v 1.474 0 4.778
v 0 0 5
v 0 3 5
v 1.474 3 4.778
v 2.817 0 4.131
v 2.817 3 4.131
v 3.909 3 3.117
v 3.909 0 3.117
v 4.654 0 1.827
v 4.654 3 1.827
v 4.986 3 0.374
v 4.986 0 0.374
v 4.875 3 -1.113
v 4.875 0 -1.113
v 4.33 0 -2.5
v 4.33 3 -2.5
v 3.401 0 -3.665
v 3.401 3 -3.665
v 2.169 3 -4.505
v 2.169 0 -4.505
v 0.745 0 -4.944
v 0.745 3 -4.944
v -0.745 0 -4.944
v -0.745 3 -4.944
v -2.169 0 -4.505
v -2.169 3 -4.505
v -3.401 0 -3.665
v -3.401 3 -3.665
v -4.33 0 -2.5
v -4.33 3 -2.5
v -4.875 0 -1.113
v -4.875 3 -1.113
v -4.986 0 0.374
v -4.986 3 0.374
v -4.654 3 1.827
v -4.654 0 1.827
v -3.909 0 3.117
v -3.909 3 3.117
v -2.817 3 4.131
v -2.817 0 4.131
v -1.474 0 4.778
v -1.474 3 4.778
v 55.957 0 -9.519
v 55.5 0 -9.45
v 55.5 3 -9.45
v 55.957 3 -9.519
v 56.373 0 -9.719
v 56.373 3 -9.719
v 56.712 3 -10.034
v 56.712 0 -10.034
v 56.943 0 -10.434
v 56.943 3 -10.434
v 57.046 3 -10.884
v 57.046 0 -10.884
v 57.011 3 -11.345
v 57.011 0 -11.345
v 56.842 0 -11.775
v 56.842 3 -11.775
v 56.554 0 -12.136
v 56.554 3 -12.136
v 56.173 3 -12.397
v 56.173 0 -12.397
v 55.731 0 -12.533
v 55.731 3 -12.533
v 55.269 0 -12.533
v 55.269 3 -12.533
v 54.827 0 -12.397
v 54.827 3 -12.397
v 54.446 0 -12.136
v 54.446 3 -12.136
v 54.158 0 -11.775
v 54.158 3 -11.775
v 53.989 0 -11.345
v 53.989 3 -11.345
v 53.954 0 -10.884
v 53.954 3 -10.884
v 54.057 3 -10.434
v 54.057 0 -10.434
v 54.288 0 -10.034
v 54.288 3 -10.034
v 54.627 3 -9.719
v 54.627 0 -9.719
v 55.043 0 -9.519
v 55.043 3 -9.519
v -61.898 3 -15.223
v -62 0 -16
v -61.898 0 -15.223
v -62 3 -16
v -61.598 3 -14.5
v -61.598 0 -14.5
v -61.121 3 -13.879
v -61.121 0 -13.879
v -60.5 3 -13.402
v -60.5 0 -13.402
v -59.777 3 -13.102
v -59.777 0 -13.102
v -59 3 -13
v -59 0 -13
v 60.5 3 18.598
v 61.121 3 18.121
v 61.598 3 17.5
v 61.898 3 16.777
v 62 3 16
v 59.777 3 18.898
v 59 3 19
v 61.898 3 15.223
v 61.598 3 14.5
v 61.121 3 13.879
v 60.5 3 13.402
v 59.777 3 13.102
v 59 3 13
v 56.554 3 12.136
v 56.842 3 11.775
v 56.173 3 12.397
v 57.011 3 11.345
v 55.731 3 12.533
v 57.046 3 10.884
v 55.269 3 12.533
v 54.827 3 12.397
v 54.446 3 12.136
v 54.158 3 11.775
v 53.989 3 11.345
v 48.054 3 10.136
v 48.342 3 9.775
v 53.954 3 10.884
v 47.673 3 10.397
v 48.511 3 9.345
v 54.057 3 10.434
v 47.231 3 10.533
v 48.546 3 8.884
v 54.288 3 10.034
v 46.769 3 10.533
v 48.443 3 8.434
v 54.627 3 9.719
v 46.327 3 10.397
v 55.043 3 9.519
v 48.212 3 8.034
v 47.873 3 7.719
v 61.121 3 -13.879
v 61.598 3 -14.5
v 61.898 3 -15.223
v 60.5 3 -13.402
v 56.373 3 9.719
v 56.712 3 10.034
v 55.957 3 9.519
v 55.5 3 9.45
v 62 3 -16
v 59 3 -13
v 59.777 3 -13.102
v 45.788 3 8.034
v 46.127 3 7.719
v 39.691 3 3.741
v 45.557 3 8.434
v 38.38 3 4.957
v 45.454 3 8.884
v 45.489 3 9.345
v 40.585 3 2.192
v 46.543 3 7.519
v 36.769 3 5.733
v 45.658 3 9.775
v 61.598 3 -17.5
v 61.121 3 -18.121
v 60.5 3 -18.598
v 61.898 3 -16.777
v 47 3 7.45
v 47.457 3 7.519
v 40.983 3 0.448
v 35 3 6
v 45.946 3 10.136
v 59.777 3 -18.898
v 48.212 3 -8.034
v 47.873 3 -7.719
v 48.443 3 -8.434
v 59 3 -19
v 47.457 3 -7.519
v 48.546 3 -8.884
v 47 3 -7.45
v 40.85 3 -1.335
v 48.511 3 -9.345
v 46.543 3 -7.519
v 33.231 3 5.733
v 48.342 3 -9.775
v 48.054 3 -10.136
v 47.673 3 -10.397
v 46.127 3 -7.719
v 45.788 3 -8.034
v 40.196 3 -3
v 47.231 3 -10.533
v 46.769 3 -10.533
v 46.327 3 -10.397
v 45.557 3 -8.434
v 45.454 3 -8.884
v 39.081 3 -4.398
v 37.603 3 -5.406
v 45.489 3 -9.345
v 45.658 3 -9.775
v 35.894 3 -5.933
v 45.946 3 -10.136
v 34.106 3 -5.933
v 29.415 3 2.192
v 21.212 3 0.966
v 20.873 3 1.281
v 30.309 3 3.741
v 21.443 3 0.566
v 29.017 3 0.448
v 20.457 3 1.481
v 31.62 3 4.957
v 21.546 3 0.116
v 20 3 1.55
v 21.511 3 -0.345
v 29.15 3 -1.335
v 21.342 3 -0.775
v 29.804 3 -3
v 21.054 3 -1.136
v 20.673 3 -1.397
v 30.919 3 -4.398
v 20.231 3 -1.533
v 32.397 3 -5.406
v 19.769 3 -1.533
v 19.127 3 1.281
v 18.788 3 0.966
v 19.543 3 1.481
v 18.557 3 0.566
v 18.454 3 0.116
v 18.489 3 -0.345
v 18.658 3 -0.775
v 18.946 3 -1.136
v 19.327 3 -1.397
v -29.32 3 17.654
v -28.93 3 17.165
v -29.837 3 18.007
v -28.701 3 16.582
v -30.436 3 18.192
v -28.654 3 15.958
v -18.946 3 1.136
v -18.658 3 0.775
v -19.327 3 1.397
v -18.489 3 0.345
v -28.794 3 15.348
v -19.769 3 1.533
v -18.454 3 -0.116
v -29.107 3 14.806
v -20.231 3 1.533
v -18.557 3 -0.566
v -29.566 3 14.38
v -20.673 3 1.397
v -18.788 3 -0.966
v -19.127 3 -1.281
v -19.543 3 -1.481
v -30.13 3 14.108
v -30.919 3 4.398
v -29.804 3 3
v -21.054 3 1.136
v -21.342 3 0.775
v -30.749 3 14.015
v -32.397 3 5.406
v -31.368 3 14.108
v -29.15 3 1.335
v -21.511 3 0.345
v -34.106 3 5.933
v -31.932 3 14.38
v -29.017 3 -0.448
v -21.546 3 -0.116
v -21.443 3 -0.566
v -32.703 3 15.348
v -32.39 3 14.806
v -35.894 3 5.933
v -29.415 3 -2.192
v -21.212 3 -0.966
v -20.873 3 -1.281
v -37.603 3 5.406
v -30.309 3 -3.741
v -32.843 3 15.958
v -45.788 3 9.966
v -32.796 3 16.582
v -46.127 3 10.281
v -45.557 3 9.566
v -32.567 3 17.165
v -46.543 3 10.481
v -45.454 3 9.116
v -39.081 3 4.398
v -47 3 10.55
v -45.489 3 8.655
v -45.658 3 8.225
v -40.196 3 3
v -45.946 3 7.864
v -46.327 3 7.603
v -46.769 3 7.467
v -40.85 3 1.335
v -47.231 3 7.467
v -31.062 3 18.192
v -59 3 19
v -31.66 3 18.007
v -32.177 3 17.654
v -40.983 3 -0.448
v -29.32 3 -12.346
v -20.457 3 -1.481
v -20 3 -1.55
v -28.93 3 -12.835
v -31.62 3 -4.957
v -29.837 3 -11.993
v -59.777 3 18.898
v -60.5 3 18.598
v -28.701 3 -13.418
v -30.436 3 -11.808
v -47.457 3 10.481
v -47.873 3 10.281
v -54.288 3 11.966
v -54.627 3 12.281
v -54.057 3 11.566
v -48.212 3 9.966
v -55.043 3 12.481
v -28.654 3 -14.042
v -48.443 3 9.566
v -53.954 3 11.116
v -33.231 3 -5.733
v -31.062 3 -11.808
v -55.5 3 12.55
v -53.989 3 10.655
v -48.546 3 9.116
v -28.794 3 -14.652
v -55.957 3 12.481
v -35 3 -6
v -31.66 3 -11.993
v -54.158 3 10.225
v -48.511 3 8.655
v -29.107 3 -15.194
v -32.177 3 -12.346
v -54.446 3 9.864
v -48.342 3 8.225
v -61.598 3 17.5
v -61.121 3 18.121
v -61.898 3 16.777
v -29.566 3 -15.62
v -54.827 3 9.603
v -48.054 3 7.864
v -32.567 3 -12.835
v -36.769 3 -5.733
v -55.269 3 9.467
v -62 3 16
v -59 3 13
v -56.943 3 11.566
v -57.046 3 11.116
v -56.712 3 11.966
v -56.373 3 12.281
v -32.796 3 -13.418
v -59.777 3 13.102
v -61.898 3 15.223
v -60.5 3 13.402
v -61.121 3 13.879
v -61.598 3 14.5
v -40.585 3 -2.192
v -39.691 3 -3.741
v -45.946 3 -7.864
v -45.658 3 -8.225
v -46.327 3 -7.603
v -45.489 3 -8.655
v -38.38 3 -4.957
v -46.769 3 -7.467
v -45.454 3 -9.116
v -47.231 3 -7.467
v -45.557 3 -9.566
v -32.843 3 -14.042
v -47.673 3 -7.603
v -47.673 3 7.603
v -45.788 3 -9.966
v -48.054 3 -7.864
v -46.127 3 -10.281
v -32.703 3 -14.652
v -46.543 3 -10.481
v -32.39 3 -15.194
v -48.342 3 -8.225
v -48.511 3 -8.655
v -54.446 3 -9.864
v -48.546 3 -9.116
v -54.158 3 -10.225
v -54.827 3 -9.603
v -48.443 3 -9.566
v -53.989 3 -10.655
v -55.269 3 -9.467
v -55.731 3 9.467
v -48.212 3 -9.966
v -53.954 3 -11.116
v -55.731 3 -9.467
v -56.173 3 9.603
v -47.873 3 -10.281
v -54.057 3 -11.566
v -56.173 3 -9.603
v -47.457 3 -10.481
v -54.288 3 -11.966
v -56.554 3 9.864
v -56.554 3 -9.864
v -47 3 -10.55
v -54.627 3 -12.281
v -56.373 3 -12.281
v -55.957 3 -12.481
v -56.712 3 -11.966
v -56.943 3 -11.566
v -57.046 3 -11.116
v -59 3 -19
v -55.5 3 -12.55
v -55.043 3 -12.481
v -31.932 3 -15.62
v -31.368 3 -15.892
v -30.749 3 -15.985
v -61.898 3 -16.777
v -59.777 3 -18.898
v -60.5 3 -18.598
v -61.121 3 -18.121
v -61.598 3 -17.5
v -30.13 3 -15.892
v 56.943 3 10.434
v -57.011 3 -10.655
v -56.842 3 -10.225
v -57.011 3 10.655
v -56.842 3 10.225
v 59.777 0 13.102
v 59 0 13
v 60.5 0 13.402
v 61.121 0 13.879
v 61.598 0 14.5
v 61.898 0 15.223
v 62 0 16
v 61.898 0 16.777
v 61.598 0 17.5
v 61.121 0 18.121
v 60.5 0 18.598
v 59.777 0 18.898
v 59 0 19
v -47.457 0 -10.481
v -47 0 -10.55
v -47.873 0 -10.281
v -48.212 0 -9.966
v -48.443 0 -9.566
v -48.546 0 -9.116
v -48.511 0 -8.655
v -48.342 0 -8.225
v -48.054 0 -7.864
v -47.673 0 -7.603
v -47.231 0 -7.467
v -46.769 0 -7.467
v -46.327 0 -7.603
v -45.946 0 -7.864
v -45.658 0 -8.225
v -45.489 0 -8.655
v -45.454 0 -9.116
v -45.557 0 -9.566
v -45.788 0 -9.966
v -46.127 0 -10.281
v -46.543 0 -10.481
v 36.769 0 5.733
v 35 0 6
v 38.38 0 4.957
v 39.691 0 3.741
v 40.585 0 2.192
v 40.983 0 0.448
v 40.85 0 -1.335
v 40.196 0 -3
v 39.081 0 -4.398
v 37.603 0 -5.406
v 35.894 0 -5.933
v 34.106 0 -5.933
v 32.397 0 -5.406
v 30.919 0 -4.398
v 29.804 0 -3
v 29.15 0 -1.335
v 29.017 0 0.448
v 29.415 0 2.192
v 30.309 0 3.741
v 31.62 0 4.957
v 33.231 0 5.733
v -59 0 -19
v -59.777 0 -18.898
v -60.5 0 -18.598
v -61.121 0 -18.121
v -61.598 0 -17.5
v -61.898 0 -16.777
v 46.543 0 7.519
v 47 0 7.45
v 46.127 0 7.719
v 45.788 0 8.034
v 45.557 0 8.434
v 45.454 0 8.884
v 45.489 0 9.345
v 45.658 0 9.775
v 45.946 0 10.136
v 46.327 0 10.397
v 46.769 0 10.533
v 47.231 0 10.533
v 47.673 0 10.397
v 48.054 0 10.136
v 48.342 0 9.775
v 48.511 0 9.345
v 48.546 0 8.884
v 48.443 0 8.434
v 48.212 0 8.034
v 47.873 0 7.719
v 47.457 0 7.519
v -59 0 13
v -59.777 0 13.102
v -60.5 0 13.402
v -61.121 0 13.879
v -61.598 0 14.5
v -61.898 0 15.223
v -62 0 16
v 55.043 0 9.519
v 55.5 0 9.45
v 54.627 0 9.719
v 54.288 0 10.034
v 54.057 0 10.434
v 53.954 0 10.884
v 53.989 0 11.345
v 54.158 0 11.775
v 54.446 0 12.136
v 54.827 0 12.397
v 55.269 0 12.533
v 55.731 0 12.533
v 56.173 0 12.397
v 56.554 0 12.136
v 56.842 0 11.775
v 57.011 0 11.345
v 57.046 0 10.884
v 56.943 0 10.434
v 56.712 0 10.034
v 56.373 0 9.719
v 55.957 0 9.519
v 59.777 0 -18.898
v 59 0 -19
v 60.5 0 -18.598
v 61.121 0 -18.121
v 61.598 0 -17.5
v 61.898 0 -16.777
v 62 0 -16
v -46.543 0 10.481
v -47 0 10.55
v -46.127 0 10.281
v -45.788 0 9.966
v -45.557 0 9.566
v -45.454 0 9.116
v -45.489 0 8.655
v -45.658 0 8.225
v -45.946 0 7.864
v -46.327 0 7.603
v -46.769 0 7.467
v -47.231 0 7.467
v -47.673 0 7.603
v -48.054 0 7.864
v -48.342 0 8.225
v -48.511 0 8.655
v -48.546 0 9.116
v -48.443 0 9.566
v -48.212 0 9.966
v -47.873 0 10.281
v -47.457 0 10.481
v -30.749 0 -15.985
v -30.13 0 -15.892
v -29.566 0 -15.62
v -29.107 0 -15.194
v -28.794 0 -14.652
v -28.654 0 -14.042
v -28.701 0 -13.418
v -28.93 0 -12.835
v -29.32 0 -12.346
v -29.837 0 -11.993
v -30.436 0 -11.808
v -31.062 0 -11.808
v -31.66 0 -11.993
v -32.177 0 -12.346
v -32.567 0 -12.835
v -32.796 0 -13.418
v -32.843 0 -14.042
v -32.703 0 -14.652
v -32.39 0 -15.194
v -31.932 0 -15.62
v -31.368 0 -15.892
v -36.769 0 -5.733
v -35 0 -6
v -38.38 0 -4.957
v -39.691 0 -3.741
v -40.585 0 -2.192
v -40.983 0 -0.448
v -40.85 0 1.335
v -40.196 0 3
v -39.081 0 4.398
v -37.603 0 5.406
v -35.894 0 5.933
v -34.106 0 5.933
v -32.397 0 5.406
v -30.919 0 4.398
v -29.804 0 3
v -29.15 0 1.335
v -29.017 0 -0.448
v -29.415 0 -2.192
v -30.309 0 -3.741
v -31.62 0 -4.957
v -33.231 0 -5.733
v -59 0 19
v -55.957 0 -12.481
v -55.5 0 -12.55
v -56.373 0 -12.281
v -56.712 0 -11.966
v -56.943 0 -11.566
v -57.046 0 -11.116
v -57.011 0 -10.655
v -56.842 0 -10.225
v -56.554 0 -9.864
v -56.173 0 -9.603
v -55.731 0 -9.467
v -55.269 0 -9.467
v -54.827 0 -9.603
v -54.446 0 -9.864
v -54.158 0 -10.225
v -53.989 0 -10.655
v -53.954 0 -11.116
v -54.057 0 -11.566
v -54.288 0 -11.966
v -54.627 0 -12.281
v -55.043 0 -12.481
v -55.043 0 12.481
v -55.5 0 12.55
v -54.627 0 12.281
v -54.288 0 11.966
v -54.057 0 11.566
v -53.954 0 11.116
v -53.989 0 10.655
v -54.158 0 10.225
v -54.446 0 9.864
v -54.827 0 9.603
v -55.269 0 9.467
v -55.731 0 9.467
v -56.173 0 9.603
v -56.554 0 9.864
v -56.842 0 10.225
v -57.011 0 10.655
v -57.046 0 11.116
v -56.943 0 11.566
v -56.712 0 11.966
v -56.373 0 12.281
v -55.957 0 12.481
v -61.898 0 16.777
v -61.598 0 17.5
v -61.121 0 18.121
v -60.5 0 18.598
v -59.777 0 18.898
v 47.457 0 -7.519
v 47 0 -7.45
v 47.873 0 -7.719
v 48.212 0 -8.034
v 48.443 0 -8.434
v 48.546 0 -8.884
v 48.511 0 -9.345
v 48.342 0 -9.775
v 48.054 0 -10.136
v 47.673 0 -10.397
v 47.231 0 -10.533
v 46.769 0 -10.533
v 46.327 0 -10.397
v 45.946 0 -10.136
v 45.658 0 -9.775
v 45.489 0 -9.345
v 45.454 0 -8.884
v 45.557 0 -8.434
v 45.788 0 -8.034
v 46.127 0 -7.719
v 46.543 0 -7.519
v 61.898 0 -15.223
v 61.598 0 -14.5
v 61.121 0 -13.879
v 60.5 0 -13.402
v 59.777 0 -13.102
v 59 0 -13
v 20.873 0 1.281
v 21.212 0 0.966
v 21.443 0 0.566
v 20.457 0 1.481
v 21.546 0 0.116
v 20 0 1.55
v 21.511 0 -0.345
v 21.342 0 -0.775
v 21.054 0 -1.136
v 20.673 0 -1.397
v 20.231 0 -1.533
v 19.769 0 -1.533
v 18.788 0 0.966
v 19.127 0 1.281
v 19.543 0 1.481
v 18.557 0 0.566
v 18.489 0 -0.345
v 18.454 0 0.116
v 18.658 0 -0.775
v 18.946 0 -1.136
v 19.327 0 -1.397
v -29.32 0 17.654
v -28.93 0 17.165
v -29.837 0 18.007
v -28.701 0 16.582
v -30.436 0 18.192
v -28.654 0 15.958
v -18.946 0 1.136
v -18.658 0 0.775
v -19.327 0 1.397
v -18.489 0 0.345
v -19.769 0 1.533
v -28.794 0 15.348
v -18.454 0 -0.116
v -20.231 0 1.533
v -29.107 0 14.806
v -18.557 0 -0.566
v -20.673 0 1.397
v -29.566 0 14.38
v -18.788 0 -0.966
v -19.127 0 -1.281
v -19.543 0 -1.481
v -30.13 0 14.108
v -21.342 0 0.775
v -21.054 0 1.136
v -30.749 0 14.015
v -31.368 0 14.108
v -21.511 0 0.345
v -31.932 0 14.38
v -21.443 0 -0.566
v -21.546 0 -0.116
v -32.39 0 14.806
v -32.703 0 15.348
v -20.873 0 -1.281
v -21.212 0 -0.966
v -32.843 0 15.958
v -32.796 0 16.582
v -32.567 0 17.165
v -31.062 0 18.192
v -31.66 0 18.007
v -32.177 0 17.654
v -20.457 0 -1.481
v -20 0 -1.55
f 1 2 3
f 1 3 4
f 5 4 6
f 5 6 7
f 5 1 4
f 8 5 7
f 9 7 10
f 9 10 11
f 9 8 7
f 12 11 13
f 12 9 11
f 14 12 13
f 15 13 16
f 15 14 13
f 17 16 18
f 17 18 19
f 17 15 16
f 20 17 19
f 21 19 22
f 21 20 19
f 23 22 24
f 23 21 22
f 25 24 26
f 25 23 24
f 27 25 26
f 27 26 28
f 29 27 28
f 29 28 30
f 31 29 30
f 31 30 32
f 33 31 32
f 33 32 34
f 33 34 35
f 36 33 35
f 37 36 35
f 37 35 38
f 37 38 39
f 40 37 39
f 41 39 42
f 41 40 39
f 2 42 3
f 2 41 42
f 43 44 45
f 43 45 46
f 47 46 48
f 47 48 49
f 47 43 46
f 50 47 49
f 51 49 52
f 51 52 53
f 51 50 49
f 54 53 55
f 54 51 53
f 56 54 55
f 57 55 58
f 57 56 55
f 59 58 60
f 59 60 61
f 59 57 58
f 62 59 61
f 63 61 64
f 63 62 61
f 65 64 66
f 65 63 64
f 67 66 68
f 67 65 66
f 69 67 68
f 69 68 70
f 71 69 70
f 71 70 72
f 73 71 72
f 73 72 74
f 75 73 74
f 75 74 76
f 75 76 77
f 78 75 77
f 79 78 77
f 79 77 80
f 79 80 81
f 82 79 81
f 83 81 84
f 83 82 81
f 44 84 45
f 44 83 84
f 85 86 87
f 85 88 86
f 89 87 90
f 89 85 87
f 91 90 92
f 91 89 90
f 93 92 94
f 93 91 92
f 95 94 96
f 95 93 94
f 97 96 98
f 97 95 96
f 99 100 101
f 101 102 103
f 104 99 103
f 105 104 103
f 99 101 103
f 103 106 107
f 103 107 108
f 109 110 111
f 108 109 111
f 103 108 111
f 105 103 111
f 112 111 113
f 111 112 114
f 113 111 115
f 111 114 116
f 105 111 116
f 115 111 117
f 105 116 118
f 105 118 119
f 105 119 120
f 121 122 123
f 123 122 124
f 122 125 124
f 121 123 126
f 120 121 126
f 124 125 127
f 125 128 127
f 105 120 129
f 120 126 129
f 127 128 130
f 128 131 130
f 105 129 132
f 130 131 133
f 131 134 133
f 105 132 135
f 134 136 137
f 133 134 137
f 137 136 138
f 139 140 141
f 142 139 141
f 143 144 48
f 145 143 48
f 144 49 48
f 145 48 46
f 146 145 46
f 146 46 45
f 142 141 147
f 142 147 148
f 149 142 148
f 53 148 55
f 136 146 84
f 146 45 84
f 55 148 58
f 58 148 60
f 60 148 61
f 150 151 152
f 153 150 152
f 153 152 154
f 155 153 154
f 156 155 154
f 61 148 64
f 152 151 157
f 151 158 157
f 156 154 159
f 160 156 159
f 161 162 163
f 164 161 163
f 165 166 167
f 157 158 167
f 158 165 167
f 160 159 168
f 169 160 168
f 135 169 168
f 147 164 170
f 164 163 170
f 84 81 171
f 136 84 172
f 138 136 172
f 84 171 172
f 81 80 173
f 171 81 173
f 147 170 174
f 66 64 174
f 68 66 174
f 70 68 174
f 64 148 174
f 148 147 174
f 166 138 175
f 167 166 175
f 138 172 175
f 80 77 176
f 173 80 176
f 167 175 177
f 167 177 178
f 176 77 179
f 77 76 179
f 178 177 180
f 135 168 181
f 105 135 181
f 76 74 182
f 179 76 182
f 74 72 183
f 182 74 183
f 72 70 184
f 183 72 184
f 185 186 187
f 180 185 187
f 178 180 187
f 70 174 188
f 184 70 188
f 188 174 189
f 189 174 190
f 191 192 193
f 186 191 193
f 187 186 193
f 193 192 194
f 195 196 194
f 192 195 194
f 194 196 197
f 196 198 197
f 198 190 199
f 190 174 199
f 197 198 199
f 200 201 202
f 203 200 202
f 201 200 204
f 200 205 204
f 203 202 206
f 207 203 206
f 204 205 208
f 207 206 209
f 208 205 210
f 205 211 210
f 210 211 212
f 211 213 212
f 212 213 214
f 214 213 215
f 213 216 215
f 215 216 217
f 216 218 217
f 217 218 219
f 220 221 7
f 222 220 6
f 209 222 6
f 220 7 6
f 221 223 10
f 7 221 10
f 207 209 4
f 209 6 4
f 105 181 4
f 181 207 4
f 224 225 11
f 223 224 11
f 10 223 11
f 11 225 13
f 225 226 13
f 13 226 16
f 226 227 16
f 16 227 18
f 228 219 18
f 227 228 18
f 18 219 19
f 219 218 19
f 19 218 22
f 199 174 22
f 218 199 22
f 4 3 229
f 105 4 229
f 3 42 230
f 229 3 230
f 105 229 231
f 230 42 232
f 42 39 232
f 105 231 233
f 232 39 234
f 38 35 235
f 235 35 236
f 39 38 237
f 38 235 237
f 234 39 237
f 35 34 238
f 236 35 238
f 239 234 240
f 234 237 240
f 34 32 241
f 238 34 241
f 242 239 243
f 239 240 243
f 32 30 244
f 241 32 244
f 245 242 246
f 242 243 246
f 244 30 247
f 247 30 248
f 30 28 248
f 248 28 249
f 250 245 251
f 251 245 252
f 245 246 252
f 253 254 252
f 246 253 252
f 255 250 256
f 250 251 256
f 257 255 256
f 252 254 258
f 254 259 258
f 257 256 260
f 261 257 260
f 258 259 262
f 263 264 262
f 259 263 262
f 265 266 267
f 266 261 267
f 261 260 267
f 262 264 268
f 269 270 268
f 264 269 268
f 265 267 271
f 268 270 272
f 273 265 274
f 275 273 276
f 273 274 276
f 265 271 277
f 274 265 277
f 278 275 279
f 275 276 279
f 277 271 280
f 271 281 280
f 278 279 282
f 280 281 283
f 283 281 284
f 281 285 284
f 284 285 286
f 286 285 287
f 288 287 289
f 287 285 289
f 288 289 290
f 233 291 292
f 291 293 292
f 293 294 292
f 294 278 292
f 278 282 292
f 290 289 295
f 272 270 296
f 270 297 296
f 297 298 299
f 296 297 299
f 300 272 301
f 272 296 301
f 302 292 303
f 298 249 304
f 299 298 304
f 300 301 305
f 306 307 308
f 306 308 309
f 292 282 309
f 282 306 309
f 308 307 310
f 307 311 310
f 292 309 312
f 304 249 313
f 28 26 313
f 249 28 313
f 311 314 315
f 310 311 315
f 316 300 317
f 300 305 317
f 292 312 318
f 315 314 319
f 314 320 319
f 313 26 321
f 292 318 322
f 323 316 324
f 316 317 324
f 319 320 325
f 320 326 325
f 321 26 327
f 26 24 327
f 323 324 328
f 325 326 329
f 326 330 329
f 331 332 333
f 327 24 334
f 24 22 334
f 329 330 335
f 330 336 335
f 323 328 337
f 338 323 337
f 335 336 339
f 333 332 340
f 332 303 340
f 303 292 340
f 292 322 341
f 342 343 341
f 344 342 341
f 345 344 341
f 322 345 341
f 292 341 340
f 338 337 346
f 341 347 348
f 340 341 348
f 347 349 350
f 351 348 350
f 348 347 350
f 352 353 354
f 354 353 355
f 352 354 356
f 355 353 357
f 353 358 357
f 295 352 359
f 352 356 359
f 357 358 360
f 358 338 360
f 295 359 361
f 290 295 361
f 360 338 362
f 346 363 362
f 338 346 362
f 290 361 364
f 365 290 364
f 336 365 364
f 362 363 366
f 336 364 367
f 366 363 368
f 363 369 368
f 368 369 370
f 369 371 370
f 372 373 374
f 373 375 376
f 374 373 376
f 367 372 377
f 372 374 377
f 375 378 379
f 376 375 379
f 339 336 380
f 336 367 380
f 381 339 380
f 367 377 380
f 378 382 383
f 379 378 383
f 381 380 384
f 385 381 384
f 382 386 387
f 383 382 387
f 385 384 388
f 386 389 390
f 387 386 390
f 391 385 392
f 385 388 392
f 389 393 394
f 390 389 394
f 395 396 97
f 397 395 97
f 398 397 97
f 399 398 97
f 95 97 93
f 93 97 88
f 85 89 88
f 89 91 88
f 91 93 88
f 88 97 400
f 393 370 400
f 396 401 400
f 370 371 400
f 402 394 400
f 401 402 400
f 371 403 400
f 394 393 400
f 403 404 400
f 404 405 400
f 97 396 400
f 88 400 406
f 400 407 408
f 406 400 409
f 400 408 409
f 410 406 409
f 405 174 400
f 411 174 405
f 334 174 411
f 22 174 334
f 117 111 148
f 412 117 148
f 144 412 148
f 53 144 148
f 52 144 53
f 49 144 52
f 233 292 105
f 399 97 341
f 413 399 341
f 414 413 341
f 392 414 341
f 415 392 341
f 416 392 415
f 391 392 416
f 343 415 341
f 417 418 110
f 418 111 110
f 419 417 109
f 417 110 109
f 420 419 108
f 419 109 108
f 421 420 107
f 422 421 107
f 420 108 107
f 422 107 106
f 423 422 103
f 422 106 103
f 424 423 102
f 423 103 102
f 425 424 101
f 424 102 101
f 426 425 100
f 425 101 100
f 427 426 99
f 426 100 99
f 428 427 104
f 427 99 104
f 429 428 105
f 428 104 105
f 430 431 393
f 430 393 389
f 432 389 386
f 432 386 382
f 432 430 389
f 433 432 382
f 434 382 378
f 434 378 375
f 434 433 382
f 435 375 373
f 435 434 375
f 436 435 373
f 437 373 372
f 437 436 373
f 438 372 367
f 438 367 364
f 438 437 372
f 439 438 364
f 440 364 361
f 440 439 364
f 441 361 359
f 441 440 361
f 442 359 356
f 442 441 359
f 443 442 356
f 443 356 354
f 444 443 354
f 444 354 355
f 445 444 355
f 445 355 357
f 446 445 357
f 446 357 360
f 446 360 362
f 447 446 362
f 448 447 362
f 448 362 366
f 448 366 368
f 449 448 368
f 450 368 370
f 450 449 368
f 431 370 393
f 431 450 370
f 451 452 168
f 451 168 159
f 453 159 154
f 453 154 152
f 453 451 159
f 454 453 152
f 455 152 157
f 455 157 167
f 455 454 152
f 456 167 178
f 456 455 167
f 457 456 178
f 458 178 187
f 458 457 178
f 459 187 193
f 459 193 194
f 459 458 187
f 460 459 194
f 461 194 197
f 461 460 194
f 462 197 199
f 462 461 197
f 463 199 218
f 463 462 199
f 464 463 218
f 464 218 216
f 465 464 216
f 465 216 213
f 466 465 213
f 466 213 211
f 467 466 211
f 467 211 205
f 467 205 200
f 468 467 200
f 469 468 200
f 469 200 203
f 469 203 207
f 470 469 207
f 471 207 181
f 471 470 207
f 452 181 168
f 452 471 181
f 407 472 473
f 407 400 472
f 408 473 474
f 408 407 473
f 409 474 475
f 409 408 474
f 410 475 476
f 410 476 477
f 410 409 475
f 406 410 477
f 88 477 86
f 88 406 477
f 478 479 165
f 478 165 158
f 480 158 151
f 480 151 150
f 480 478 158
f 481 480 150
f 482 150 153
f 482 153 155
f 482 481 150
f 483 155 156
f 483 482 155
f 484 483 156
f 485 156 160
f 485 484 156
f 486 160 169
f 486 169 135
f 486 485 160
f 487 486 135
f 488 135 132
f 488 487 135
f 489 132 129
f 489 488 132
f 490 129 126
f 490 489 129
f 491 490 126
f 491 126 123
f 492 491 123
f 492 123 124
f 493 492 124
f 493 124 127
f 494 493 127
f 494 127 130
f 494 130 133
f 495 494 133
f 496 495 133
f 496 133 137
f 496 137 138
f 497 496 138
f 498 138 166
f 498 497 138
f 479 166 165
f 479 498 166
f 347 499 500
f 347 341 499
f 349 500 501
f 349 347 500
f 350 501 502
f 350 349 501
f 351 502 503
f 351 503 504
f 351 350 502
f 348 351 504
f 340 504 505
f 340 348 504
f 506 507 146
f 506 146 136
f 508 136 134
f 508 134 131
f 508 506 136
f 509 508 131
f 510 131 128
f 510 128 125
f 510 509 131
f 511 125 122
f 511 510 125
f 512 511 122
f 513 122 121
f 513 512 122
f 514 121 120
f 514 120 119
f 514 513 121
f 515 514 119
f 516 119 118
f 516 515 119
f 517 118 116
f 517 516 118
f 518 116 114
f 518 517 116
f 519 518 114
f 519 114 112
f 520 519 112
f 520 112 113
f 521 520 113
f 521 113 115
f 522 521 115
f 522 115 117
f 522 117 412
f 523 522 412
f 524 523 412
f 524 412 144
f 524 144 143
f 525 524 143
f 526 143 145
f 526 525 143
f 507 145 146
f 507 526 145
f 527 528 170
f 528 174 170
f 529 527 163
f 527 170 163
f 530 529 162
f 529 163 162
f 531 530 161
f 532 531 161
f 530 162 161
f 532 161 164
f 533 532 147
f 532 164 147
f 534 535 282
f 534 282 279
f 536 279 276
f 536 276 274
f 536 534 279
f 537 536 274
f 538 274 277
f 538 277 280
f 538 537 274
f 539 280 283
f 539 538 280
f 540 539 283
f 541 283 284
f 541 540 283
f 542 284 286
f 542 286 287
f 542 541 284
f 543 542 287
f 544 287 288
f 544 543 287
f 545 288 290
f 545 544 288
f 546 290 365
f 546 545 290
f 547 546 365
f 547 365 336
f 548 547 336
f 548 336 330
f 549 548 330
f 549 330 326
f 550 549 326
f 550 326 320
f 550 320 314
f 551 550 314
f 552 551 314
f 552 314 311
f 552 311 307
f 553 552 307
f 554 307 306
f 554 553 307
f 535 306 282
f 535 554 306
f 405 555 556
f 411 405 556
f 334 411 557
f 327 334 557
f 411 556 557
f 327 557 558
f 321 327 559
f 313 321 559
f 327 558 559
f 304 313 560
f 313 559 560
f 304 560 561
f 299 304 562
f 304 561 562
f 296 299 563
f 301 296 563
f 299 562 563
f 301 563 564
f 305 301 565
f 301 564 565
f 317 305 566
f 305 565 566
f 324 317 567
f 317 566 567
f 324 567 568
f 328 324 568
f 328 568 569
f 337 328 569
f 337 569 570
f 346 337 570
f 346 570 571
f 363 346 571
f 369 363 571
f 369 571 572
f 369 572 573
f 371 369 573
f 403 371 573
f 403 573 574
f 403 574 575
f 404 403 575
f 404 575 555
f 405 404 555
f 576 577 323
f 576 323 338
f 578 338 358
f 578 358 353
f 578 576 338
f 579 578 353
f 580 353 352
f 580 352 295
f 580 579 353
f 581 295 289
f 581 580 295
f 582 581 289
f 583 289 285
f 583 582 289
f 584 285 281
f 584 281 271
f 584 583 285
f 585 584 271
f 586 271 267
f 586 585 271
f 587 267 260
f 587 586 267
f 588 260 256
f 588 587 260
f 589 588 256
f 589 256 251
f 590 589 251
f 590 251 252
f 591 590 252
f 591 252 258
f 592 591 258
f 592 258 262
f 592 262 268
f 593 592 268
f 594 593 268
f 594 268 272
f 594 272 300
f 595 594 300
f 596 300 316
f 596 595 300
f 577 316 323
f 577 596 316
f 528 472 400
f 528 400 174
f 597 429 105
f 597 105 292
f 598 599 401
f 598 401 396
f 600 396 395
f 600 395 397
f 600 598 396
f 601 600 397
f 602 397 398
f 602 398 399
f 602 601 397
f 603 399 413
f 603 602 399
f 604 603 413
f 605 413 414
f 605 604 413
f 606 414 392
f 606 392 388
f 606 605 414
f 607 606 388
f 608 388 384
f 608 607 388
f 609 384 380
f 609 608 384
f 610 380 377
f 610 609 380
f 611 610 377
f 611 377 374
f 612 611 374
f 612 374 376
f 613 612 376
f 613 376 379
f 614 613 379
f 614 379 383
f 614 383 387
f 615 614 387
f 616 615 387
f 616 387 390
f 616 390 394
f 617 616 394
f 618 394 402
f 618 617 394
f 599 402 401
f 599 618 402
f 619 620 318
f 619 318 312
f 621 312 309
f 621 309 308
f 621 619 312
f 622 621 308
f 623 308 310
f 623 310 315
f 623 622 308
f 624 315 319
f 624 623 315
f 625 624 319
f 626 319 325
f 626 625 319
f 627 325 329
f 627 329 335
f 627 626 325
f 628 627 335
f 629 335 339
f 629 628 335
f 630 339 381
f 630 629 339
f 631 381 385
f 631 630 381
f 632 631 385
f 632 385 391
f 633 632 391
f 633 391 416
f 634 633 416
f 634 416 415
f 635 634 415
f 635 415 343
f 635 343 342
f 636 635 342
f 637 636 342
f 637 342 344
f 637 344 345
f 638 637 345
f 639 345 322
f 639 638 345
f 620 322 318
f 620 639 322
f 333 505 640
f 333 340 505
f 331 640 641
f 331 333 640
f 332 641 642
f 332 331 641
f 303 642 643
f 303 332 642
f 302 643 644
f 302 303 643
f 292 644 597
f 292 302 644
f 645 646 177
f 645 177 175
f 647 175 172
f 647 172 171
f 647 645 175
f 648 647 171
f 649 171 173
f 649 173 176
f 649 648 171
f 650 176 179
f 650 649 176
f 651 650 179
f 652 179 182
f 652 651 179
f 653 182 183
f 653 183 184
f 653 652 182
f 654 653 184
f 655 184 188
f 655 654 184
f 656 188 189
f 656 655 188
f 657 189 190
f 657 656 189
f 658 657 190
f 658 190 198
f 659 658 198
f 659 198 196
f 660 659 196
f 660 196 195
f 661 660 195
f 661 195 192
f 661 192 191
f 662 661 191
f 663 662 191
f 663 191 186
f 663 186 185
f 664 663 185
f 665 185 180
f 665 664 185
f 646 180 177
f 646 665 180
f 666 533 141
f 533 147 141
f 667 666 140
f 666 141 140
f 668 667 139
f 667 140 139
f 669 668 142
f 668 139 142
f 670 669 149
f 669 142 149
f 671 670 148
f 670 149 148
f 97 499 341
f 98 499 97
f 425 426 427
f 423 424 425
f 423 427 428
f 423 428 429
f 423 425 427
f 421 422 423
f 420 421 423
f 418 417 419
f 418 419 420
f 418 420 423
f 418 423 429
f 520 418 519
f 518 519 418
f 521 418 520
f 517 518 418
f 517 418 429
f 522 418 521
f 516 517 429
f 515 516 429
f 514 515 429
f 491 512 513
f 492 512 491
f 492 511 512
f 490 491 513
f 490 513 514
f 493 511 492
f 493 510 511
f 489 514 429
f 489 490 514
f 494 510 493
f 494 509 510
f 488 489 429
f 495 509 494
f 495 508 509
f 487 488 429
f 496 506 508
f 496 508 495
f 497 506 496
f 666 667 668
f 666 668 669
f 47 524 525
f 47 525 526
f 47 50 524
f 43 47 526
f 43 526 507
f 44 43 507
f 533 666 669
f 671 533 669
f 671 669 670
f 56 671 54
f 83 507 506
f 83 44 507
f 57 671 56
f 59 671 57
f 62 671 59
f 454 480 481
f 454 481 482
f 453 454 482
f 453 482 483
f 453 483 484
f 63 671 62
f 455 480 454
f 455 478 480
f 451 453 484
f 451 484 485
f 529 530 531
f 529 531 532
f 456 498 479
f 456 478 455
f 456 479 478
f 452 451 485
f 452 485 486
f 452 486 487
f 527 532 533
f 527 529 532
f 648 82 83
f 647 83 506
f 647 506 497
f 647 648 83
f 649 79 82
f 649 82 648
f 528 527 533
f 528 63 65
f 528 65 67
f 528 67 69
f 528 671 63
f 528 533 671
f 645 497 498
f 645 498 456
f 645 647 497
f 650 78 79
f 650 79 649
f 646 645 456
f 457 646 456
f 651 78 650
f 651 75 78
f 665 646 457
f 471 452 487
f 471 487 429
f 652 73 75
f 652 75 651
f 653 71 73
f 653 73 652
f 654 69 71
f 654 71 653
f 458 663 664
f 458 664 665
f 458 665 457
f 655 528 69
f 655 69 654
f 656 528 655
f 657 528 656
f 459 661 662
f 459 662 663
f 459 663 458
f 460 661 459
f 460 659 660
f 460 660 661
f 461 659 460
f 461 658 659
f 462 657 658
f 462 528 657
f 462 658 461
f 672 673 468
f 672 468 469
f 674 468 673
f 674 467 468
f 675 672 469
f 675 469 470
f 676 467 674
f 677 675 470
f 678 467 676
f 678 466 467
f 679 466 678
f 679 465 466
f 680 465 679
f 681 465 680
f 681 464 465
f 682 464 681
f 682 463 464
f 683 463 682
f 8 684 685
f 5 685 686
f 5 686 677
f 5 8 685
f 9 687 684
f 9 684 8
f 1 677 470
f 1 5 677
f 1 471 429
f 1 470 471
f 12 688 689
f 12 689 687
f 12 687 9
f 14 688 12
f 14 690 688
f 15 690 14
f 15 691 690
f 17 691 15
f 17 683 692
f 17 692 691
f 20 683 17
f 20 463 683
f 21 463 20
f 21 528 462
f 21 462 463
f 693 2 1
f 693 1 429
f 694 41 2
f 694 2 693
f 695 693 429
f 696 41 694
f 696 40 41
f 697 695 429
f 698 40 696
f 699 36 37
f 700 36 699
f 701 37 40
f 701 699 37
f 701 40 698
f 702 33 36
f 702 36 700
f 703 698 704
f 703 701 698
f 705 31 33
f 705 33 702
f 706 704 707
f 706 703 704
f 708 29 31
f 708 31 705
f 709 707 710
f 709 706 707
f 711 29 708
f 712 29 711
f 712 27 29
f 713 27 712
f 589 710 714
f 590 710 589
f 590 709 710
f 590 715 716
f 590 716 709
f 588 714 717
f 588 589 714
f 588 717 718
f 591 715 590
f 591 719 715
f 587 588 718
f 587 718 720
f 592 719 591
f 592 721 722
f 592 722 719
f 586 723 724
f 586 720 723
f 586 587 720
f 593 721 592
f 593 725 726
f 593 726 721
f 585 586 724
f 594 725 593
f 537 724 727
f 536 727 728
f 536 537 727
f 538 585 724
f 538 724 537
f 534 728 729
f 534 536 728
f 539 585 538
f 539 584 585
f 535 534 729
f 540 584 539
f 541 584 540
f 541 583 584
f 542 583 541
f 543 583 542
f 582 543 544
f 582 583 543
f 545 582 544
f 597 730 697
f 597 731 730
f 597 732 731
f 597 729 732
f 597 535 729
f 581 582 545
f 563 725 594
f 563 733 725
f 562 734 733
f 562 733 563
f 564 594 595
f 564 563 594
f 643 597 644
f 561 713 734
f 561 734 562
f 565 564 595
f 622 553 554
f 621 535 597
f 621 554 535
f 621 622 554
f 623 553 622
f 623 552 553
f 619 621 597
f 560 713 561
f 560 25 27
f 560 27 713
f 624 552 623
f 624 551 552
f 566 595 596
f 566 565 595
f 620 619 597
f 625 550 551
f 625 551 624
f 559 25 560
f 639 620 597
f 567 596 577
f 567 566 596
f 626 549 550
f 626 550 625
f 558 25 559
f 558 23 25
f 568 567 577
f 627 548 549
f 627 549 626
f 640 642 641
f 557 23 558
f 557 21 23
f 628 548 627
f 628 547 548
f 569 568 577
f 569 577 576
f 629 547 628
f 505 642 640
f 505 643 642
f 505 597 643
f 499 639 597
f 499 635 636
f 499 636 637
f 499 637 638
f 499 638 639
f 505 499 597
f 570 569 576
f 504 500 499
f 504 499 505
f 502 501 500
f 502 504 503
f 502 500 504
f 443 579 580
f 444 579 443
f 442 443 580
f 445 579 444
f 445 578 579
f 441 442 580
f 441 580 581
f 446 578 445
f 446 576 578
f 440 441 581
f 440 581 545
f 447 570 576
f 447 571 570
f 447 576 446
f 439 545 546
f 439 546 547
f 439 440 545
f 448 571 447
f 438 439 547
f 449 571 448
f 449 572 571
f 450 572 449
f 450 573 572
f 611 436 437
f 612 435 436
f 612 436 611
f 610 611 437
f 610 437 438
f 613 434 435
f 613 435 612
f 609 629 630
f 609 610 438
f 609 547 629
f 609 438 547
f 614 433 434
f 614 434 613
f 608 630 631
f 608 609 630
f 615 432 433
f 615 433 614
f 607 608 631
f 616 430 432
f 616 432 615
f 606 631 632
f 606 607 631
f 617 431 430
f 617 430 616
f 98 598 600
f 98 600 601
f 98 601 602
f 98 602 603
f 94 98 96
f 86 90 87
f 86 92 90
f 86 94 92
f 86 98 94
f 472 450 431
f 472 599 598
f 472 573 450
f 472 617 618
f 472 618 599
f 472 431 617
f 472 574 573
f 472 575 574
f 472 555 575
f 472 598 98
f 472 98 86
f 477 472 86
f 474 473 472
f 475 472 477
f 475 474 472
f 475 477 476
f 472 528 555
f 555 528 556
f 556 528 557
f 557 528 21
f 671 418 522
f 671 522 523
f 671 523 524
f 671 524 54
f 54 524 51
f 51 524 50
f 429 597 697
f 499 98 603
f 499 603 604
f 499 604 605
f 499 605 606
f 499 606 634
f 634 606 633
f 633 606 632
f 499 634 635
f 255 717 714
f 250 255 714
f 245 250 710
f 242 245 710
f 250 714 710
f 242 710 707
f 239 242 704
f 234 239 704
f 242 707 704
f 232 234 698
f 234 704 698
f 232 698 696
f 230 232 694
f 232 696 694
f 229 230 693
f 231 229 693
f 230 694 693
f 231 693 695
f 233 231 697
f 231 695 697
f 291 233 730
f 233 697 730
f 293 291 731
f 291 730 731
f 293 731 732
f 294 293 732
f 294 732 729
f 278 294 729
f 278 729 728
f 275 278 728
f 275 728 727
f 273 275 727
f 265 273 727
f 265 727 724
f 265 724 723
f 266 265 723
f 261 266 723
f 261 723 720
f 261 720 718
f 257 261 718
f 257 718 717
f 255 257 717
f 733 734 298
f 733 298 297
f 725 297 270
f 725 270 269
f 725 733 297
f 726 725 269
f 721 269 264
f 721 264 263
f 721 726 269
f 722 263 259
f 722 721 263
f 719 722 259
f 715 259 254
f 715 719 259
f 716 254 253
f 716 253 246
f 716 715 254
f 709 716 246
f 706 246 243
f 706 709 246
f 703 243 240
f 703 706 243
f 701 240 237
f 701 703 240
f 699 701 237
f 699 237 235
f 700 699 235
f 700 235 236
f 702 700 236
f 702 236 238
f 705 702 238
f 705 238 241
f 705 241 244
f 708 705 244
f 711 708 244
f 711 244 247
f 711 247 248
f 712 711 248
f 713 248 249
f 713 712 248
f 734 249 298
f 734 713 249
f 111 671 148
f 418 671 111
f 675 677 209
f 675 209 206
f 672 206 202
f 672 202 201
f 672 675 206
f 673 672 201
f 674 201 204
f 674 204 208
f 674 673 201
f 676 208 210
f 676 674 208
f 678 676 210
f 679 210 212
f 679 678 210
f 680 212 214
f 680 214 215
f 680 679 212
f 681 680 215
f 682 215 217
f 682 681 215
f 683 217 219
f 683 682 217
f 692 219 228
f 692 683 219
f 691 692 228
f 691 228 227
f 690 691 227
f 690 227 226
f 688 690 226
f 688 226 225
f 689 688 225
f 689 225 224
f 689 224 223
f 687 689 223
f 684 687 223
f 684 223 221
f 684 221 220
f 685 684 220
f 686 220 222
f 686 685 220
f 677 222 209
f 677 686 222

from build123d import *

# Parameters (mm, degrees)
SKETCH1_R           = 1.55
SKETCH1_R_2         = 5
SKETCH1_R_3         = 6
BOSS_EXTRUDE1_DEPTH = 3
FILLET1_R           = 3
SKETCH_3_R          = 2.1
CUT_EXTRUDE_1_DEPTH = 10


with BuildPart() as part:
    # Sketch1 → Boss-Extrude1 (new body)
    with BuildSketch(Plane(origin=(0, 0, 0), x_dir=(1, 0, 0), z_dir=(0, 1, 0))):
        Polygon((-62, 19), (62, 19), (62, 13), (59, 13), (59, -13), (62, -13), (62, -19), (-62, -19), (-62, -13), (-59, -13), (-59, 13), (-62, 13), align=None)
        with Locations(Location((55.5, 11, 0), (0, 0, 270))):
            Circle(SKETCH1_R, mode=Mode.SUBTRACT)
        with Locations(Location((-55.5, 11, 0), (0, 0, 90))):
            Circle(SKETCH1_R, mode=Mode.SUBTRACT)
        with Locations(Location((-55.5, -11, 0), (0, 0, 270))):
            Circle(SKETCH1_R, mode=Mode.SUBTRACT)
        with Locations(Location((55.5, -11, 0), (0, 0, 90))):
            Circle(SKETCH1_R, mode=Mode.SUBTRACT)
        with Locations(Location((0, 0, 0), (0, 0, 270))):
            Circle(SKETCH1_R_2, mode=Mode.SUBTRACT)
        with Locations(Location((20, 0, 0), (0, 0, 270))):
            Circle(SKETCH1_R, mode=Mode.SUBTRACT)
        with Locations(Location((-20, 0, 0), (0, 0, 90))):
            Circle(SKETCH1_R, mode=Mode.SUBTRACT)
        with Locations(Location((35, 0, 0), (0, 0, 270))):
            Circle(SKETCH1_R_3, mode=Mode.SUBTRACT)
        with Locations(Location((-35, 0, 0), (0, 0, 90))):
            Circle(SKETCH1_R_3, mode=Mode.SUBTRACT)
        with Locations(Location((47, 9, 0), (0, 0, 270))):
            Circle(SKETCH1_R, mode=Mode.SUBTRACT)
        with Locations(Location((47, -9, 0), (0, 0, 90))):
            Circle(SKETCH1_R, mode=Mode.SUBTRACT)
        with Locations(Location((-47, -9, 0), (0, 0, 270))):
            Circle(SKETCH1_R, mode=Mode.SUBTRACT)
        with Locations(Location((-47, 9, 0), (0, 0, 90))):
            Circle(SKETCH1_R, mode=Mode.SUBTRACT)
    extrude(amount=BOSS_EXTRUDE1_DEPTH)

    # Fillet1
    fillet1_edges = [part.edges().sort_by_distance(p)[0] for p in [
        (-62, 1.5, -19),
        (-62, 1.5, -13),
        (-62, 1.5, 13),
        (-62, 1.5, 19),
        (62, 1.5, 19),
        (62, 1.5, 13),
        (62, 1.5, -13),
        (62, 1.5, -19),
    ]]
    fillet(fillet1_edges, radius=FILLET1_R - 0.0001)  # a hair under: the kernel refuses the full size

    # 草图3 → 切除-拉伸1 (cut)
    with BuildSketch(Plane.XZ):
        with Locations(Location((-30.748546153, -13.88500521, 0), (0, 0, 270))):
            Circle(SKETCH_3_R)
        with Locations(Location((-30.748546153, 16.11499479, 0), (0, 0, 270))):
            Circle(SKETCH_3_R)
    extrude(amount=-CUT_EXTRUDE_1_DEPTH, mode=Mode.SUBTRACT)


solid = part.part
